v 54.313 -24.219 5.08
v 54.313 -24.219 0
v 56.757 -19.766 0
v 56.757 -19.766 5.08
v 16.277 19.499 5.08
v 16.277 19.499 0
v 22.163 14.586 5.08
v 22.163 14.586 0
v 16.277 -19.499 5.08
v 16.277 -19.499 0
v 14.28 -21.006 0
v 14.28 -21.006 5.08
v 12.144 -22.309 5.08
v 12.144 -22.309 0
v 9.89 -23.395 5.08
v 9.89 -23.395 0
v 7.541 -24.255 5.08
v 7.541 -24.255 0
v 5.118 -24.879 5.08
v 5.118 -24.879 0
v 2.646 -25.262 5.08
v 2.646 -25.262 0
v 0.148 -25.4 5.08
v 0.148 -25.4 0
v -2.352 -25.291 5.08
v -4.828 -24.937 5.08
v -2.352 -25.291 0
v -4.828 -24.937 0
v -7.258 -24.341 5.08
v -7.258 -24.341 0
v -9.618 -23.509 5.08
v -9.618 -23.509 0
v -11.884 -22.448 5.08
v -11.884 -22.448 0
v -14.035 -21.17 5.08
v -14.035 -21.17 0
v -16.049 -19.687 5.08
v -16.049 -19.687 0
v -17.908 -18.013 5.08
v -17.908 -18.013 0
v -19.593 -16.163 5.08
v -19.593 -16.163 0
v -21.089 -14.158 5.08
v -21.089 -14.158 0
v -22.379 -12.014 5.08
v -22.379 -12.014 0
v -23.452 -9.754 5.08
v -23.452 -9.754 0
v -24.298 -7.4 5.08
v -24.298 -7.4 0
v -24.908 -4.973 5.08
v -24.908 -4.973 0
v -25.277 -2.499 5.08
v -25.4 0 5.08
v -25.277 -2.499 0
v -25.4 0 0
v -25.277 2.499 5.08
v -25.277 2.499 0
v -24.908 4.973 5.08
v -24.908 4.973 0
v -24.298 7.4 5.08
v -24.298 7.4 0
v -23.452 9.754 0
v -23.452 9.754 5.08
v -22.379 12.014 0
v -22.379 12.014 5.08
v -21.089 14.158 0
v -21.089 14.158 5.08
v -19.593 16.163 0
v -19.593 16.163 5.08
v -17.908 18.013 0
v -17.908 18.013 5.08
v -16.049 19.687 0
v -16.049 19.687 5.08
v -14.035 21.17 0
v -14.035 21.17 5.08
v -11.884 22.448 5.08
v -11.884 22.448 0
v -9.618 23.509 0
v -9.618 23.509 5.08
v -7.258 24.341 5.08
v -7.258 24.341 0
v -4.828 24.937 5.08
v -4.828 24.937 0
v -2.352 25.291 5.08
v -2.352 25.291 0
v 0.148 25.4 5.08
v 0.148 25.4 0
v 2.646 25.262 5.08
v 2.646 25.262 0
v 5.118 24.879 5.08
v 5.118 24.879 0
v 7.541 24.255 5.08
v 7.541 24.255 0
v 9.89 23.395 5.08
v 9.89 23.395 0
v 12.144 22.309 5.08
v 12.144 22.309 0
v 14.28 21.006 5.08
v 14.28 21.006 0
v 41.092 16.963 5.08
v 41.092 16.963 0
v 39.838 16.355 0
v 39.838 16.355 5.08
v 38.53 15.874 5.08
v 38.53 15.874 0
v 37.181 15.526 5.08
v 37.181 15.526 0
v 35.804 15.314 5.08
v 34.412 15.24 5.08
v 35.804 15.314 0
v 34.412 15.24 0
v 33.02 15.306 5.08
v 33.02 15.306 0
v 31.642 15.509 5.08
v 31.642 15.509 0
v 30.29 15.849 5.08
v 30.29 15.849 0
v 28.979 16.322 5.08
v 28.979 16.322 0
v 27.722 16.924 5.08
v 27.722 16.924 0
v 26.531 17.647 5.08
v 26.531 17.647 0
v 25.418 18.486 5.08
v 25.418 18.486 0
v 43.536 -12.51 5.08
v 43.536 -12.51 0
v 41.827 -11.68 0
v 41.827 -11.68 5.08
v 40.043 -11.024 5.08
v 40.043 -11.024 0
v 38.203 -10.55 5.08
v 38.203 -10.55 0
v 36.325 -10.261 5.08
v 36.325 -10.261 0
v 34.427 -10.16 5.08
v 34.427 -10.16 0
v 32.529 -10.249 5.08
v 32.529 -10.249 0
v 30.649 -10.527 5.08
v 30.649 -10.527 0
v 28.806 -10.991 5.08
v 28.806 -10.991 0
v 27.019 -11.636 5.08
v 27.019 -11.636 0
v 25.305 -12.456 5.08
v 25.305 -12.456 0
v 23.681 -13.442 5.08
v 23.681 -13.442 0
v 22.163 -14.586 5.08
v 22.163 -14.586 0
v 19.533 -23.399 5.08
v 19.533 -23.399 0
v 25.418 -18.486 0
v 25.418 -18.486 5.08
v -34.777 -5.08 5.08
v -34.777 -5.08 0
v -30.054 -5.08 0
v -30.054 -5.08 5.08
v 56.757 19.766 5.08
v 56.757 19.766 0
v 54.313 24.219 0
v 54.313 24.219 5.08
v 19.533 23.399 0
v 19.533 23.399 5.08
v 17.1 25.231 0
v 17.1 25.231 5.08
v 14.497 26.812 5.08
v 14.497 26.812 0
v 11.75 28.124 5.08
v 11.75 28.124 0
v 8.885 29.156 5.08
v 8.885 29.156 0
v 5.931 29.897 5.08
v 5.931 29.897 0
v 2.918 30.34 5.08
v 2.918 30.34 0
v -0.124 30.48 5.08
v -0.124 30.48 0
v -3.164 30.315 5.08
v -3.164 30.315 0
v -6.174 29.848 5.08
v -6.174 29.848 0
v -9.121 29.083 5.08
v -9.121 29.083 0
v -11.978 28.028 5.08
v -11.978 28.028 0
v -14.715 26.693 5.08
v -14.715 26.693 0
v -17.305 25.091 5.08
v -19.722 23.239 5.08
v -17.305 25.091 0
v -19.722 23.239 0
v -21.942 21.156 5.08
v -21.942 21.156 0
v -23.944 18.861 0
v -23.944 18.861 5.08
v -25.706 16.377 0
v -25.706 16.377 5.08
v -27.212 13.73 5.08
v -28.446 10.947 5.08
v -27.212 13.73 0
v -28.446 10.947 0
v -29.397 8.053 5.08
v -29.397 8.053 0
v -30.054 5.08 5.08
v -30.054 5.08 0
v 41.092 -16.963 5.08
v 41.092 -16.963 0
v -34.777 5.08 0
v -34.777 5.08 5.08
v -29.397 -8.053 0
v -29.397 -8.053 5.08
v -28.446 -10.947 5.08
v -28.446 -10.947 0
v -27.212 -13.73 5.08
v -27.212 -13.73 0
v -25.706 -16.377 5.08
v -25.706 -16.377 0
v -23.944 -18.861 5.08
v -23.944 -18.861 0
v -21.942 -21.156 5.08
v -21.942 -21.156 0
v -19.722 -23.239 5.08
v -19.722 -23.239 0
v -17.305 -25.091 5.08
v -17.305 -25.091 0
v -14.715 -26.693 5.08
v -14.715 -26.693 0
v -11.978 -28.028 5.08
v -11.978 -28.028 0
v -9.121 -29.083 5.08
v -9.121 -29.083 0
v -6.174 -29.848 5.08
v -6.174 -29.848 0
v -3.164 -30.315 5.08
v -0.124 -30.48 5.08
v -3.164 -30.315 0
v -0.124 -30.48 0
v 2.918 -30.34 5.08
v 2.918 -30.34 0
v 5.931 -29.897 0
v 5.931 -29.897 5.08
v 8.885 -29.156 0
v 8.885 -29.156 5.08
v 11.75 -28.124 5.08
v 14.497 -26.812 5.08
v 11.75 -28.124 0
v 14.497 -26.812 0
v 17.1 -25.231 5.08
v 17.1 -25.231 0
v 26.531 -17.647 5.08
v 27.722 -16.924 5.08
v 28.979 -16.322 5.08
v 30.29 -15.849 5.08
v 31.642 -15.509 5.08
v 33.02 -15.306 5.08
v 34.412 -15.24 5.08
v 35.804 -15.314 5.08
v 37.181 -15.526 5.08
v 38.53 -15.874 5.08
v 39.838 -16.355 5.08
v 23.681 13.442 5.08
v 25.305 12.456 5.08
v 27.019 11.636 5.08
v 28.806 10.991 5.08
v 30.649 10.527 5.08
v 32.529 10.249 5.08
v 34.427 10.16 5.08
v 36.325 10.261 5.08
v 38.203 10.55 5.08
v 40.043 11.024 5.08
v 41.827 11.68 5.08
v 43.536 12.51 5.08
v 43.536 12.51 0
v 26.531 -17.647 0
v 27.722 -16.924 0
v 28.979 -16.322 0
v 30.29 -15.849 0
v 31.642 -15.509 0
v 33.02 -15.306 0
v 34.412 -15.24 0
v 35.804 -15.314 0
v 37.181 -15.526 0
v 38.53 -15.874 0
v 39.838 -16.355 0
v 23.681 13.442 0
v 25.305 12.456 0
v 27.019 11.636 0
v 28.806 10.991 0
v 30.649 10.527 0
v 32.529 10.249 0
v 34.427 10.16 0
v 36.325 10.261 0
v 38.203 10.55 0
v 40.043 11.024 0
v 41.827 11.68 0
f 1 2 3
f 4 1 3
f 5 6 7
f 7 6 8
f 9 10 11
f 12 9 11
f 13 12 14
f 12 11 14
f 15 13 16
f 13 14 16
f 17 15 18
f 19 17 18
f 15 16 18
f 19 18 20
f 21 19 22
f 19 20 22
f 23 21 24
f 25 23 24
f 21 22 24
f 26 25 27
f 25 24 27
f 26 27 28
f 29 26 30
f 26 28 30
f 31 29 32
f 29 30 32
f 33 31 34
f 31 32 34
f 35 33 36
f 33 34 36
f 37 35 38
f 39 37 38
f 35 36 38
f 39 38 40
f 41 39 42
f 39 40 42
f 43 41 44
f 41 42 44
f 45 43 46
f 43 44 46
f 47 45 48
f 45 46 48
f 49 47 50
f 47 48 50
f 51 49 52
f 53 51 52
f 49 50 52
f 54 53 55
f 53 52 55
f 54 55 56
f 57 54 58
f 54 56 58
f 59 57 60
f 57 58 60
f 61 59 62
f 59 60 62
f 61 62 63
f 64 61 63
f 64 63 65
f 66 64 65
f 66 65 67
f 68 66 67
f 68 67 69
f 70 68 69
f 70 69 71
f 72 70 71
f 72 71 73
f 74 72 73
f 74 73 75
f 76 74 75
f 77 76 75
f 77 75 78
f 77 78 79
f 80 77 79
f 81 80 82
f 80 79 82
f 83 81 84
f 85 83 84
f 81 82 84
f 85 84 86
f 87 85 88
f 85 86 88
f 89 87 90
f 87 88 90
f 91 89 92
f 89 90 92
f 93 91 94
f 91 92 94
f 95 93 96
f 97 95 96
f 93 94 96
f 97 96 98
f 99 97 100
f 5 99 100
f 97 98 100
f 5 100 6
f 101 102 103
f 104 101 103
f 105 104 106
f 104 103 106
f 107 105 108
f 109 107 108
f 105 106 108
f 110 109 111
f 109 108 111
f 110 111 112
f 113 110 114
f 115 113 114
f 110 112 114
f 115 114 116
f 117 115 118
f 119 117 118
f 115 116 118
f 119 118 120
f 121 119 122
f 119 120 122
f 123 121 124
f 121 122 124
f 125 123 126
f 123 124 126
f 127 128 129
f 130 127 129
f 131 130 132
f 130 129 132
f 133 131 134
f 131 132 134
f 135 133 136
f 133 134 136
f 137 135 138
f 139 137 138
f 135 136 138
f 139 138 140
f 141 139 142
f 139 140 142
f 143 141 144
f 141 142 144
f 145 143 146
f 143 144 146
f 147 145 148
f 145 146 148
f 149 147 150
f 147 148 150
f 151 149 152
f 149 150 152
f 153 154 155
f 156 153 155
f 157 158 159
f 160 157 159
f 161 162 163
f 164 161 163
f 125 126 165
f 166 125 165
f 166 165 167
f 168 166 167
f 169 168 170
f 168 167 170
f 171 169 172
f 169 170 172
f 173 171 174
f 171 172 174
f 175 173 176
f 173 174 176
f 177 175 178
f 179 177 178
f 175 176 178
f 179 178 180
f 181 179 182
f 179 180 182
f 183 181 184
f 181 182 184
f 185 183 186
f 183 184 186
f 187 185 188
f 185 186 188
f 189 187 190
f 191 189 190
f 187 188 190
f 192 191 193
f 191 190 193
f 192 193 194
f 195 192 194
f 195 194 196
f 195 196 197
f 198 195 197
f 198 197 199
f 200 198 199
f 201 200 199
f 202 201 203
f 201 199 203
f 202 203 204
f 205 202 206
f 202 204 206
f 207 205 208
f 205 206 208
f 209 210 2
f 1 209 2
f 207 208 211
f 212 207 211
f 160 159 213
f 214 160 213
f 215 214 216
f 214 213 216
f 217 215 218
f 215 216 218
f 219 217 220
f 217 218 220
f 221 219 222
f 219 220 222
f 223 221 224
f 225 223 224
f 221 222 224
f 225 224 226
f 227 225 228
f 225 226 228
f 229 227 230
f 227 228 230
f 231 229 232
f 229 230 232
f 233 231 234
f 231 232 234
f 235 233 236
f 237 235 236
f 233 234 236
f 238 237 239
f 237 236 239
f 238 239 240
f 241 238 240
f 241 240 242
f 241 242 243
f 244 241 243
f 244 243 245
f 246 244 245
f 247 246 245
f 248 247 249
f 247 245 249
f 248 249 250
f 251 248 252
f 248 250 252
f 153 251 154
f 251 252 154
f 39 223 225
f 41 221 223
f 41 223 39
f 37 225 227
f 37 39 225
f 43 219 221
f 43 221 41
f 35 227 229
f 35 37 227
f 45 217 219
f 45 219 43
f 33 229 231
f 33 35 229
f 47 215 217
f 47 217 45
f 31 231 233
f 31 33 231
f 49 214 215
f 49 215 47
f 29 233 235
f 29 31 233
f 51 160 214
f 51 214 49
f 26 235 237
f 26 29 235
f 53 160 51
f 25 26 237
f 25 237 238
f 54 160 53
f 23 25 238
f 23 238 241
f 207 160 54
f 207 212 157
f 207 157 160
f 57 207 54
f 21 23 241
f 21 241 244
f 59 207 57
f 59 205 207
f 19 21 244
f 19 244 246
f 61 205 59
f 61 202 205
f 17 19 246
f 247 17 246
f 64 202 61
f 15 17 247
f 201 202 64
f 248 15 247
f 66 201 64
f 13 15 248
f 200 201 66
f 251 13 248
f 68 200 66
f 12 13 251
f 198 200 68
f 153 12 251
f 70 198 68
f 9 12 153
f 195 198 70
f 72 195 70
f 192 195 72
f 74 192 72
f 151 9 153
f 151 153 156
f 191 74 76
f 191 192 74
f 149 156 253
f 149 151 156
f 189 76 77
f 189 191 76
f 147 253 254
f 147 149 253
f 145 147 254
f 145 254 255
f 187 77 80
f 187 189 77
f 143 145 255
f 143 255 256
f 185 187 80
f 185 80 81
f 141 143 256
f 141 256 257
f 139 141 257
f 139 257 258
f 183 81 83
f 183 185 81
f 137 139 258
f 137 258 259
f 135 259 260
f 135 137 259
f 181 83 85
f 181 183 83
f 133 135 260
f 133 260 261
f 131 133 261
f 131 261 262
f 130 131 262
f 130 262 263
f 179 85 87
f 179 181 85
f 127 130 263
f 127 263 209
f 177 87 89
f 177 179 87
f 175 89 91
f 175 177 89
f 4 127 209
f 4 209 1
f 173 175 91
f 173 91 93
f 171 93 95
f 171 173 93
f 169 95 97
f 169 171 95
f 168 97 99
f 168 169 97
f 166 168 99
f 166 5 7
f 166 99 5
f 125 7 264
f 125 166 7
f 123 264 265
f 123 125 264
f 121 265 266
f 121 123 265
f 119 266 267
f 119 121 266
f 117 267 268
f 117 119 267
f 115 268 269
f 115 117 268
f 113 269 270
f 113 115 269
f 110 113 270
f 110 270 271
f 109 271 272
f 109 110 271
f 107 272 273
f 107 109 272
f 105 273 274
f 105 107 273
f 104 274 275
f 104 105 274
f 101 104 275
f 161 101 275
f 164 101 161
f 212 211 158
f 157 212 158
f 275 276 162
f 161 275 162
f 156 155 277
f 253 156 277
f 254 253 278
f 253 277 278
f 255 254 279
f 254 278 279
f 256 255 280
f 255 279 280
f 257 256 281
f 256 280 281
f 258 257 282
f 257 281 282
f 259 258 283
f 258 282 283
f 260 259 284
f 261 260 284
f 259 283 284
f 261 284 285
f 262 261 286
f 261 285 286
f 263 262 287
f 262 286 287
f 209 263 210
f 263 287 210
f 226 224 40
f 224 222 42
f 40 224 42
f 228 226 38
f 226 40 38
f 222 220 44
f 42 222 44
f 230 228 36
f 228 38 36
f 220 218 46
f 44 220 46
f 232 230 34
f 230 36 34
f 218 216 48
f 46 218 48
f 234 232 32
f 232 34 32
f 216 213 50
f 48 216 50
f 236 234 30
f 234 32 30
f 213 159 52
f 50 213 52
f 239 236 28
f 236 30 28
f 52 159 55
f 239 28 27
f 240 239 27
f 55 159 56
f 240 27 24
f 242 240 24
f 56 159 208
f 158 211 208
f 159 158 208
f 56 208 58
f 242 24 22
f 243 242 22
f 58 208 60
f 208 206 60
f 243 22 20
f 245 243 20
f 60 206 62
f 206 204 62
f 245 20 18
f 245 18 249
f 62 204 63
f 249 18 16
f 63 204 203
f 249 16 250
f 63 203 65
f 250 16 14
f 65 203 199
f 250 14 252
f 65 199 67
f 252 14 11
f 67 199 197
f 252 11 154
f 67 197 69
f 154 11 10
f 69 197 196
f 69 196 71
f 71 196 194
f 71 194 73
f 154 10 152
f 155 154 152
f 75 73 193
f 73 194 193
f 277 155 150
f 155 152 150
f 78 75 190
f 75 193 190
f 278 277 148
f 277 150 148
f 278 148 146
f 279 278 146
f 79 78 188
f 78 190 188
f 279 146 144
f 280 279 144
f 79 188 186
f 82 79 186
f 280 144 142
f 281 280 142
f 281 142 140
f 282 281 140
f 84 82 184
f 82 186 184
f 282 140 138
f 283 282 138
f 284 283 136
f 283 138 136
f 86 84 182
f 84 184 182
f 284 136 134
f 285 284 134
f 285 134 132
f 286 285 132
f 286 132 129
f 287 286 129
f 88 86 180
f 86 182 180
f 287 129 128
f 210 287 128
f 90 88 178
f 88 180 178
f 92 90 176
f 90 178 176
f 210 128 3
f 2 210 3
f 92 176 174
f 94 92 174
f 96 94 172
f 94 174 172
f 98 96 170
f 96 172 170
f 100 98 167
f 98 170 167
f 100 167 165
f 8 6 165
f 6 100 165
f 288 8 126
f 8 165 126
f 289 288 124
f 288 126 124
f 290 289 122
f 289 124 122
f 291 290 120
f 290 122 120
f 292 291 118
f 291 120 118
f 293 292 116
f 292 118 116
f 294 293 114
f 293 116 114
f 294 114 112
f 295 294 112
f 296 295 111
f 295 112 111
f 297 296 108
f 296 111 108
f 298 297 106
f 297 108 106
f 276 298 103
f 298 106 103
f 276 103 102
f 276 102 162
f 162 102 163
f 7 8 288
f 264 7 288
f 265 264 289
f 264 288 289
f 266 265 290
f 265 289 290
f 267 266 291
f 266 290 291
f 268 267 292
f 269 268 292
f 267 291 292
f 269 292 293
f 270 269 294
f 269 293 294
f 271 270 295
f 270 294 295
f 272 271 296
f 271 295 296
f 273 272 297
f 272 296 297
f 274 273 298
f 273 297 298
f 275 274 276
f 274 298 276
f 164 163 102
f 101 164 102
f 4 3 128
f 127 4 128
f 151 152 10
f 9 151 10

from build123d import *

# Parameters (mm, degrees)
EXTRUDE1_DEPTH = 5.08


with BuildPart() as part:
    # Sketch1 → Extrude1 (new body)
    with BuildSketch(Plane.XY):
        with BuildLine():
            Line((16.277171033, 19.499069289), (22.162906601, 14.585854045))
            ThreePointArc((22.162906601, 14.585854045), (32.529038116, 10.249394717), (43.535952824, 12.509790851))
            Line((43.535952824, 12.509790851), (56.757436861, 19.765747267))
            Line((56.757436861, 19.765747267), (54.313392075, 24.219177976))
            Line((54.313392075, 24.219177976), (41.091908038, 16.963221561))
            ThreePointArc((41.091908038, 16.963221561), (33.020170585, 15.305597729), (25.418340808, 18.485667902))
            Line((25.418340808, 18.485667902), (19.53260524, 23.398883147))
            ThreePointArc((19.53260524, 23.398883147), (-10.562606276, 28.591287985), (-30.053685298, 5.08))
            Line((-30.053685298, 5.08), (-34.776815298, 5.08))
            Line((-34.776815298, 5.08), (-34.776815298, -5.08))
            Line((-34.776815298, -5.08), (-30.053685298, -5.08))
            ThreePointArc((-30.053685298, -5.08), (-10.562606276, -28.591287985), (19.53260524, -23.398883147))
            Line((19.53260524, -23.398883147), (25.418340808, -18.485667902))
            ThreePointArc((25.418340808, -18.485667902), (33.020170585, -15.305597729), (41.091908038, -16.963221561))
            Line((41.091908038, -16.963221561), (54.313392075, -24.219177976))
            Line((54.313392075, -24.219177976), (56.757436861, -19.765747267))
            Line((56.757436861, -19.765747267), (43.535952824, -12.509790851))
            ThreePointArc((43.535952824, -12.509790851), (32.529038116, -10.249394717), (22.162906601, -14.585854045))
            Line((22.162906601, -14.585854045), (16.277171033, -19.499069289))
            ThreePointArc((16.277171033, -19.499069289), (-25.4, 0), (16.277171033, 19.499069289))
        make_face()
    extrude(amount=EXTRUDE1_DEPTH)


solid = part.part
